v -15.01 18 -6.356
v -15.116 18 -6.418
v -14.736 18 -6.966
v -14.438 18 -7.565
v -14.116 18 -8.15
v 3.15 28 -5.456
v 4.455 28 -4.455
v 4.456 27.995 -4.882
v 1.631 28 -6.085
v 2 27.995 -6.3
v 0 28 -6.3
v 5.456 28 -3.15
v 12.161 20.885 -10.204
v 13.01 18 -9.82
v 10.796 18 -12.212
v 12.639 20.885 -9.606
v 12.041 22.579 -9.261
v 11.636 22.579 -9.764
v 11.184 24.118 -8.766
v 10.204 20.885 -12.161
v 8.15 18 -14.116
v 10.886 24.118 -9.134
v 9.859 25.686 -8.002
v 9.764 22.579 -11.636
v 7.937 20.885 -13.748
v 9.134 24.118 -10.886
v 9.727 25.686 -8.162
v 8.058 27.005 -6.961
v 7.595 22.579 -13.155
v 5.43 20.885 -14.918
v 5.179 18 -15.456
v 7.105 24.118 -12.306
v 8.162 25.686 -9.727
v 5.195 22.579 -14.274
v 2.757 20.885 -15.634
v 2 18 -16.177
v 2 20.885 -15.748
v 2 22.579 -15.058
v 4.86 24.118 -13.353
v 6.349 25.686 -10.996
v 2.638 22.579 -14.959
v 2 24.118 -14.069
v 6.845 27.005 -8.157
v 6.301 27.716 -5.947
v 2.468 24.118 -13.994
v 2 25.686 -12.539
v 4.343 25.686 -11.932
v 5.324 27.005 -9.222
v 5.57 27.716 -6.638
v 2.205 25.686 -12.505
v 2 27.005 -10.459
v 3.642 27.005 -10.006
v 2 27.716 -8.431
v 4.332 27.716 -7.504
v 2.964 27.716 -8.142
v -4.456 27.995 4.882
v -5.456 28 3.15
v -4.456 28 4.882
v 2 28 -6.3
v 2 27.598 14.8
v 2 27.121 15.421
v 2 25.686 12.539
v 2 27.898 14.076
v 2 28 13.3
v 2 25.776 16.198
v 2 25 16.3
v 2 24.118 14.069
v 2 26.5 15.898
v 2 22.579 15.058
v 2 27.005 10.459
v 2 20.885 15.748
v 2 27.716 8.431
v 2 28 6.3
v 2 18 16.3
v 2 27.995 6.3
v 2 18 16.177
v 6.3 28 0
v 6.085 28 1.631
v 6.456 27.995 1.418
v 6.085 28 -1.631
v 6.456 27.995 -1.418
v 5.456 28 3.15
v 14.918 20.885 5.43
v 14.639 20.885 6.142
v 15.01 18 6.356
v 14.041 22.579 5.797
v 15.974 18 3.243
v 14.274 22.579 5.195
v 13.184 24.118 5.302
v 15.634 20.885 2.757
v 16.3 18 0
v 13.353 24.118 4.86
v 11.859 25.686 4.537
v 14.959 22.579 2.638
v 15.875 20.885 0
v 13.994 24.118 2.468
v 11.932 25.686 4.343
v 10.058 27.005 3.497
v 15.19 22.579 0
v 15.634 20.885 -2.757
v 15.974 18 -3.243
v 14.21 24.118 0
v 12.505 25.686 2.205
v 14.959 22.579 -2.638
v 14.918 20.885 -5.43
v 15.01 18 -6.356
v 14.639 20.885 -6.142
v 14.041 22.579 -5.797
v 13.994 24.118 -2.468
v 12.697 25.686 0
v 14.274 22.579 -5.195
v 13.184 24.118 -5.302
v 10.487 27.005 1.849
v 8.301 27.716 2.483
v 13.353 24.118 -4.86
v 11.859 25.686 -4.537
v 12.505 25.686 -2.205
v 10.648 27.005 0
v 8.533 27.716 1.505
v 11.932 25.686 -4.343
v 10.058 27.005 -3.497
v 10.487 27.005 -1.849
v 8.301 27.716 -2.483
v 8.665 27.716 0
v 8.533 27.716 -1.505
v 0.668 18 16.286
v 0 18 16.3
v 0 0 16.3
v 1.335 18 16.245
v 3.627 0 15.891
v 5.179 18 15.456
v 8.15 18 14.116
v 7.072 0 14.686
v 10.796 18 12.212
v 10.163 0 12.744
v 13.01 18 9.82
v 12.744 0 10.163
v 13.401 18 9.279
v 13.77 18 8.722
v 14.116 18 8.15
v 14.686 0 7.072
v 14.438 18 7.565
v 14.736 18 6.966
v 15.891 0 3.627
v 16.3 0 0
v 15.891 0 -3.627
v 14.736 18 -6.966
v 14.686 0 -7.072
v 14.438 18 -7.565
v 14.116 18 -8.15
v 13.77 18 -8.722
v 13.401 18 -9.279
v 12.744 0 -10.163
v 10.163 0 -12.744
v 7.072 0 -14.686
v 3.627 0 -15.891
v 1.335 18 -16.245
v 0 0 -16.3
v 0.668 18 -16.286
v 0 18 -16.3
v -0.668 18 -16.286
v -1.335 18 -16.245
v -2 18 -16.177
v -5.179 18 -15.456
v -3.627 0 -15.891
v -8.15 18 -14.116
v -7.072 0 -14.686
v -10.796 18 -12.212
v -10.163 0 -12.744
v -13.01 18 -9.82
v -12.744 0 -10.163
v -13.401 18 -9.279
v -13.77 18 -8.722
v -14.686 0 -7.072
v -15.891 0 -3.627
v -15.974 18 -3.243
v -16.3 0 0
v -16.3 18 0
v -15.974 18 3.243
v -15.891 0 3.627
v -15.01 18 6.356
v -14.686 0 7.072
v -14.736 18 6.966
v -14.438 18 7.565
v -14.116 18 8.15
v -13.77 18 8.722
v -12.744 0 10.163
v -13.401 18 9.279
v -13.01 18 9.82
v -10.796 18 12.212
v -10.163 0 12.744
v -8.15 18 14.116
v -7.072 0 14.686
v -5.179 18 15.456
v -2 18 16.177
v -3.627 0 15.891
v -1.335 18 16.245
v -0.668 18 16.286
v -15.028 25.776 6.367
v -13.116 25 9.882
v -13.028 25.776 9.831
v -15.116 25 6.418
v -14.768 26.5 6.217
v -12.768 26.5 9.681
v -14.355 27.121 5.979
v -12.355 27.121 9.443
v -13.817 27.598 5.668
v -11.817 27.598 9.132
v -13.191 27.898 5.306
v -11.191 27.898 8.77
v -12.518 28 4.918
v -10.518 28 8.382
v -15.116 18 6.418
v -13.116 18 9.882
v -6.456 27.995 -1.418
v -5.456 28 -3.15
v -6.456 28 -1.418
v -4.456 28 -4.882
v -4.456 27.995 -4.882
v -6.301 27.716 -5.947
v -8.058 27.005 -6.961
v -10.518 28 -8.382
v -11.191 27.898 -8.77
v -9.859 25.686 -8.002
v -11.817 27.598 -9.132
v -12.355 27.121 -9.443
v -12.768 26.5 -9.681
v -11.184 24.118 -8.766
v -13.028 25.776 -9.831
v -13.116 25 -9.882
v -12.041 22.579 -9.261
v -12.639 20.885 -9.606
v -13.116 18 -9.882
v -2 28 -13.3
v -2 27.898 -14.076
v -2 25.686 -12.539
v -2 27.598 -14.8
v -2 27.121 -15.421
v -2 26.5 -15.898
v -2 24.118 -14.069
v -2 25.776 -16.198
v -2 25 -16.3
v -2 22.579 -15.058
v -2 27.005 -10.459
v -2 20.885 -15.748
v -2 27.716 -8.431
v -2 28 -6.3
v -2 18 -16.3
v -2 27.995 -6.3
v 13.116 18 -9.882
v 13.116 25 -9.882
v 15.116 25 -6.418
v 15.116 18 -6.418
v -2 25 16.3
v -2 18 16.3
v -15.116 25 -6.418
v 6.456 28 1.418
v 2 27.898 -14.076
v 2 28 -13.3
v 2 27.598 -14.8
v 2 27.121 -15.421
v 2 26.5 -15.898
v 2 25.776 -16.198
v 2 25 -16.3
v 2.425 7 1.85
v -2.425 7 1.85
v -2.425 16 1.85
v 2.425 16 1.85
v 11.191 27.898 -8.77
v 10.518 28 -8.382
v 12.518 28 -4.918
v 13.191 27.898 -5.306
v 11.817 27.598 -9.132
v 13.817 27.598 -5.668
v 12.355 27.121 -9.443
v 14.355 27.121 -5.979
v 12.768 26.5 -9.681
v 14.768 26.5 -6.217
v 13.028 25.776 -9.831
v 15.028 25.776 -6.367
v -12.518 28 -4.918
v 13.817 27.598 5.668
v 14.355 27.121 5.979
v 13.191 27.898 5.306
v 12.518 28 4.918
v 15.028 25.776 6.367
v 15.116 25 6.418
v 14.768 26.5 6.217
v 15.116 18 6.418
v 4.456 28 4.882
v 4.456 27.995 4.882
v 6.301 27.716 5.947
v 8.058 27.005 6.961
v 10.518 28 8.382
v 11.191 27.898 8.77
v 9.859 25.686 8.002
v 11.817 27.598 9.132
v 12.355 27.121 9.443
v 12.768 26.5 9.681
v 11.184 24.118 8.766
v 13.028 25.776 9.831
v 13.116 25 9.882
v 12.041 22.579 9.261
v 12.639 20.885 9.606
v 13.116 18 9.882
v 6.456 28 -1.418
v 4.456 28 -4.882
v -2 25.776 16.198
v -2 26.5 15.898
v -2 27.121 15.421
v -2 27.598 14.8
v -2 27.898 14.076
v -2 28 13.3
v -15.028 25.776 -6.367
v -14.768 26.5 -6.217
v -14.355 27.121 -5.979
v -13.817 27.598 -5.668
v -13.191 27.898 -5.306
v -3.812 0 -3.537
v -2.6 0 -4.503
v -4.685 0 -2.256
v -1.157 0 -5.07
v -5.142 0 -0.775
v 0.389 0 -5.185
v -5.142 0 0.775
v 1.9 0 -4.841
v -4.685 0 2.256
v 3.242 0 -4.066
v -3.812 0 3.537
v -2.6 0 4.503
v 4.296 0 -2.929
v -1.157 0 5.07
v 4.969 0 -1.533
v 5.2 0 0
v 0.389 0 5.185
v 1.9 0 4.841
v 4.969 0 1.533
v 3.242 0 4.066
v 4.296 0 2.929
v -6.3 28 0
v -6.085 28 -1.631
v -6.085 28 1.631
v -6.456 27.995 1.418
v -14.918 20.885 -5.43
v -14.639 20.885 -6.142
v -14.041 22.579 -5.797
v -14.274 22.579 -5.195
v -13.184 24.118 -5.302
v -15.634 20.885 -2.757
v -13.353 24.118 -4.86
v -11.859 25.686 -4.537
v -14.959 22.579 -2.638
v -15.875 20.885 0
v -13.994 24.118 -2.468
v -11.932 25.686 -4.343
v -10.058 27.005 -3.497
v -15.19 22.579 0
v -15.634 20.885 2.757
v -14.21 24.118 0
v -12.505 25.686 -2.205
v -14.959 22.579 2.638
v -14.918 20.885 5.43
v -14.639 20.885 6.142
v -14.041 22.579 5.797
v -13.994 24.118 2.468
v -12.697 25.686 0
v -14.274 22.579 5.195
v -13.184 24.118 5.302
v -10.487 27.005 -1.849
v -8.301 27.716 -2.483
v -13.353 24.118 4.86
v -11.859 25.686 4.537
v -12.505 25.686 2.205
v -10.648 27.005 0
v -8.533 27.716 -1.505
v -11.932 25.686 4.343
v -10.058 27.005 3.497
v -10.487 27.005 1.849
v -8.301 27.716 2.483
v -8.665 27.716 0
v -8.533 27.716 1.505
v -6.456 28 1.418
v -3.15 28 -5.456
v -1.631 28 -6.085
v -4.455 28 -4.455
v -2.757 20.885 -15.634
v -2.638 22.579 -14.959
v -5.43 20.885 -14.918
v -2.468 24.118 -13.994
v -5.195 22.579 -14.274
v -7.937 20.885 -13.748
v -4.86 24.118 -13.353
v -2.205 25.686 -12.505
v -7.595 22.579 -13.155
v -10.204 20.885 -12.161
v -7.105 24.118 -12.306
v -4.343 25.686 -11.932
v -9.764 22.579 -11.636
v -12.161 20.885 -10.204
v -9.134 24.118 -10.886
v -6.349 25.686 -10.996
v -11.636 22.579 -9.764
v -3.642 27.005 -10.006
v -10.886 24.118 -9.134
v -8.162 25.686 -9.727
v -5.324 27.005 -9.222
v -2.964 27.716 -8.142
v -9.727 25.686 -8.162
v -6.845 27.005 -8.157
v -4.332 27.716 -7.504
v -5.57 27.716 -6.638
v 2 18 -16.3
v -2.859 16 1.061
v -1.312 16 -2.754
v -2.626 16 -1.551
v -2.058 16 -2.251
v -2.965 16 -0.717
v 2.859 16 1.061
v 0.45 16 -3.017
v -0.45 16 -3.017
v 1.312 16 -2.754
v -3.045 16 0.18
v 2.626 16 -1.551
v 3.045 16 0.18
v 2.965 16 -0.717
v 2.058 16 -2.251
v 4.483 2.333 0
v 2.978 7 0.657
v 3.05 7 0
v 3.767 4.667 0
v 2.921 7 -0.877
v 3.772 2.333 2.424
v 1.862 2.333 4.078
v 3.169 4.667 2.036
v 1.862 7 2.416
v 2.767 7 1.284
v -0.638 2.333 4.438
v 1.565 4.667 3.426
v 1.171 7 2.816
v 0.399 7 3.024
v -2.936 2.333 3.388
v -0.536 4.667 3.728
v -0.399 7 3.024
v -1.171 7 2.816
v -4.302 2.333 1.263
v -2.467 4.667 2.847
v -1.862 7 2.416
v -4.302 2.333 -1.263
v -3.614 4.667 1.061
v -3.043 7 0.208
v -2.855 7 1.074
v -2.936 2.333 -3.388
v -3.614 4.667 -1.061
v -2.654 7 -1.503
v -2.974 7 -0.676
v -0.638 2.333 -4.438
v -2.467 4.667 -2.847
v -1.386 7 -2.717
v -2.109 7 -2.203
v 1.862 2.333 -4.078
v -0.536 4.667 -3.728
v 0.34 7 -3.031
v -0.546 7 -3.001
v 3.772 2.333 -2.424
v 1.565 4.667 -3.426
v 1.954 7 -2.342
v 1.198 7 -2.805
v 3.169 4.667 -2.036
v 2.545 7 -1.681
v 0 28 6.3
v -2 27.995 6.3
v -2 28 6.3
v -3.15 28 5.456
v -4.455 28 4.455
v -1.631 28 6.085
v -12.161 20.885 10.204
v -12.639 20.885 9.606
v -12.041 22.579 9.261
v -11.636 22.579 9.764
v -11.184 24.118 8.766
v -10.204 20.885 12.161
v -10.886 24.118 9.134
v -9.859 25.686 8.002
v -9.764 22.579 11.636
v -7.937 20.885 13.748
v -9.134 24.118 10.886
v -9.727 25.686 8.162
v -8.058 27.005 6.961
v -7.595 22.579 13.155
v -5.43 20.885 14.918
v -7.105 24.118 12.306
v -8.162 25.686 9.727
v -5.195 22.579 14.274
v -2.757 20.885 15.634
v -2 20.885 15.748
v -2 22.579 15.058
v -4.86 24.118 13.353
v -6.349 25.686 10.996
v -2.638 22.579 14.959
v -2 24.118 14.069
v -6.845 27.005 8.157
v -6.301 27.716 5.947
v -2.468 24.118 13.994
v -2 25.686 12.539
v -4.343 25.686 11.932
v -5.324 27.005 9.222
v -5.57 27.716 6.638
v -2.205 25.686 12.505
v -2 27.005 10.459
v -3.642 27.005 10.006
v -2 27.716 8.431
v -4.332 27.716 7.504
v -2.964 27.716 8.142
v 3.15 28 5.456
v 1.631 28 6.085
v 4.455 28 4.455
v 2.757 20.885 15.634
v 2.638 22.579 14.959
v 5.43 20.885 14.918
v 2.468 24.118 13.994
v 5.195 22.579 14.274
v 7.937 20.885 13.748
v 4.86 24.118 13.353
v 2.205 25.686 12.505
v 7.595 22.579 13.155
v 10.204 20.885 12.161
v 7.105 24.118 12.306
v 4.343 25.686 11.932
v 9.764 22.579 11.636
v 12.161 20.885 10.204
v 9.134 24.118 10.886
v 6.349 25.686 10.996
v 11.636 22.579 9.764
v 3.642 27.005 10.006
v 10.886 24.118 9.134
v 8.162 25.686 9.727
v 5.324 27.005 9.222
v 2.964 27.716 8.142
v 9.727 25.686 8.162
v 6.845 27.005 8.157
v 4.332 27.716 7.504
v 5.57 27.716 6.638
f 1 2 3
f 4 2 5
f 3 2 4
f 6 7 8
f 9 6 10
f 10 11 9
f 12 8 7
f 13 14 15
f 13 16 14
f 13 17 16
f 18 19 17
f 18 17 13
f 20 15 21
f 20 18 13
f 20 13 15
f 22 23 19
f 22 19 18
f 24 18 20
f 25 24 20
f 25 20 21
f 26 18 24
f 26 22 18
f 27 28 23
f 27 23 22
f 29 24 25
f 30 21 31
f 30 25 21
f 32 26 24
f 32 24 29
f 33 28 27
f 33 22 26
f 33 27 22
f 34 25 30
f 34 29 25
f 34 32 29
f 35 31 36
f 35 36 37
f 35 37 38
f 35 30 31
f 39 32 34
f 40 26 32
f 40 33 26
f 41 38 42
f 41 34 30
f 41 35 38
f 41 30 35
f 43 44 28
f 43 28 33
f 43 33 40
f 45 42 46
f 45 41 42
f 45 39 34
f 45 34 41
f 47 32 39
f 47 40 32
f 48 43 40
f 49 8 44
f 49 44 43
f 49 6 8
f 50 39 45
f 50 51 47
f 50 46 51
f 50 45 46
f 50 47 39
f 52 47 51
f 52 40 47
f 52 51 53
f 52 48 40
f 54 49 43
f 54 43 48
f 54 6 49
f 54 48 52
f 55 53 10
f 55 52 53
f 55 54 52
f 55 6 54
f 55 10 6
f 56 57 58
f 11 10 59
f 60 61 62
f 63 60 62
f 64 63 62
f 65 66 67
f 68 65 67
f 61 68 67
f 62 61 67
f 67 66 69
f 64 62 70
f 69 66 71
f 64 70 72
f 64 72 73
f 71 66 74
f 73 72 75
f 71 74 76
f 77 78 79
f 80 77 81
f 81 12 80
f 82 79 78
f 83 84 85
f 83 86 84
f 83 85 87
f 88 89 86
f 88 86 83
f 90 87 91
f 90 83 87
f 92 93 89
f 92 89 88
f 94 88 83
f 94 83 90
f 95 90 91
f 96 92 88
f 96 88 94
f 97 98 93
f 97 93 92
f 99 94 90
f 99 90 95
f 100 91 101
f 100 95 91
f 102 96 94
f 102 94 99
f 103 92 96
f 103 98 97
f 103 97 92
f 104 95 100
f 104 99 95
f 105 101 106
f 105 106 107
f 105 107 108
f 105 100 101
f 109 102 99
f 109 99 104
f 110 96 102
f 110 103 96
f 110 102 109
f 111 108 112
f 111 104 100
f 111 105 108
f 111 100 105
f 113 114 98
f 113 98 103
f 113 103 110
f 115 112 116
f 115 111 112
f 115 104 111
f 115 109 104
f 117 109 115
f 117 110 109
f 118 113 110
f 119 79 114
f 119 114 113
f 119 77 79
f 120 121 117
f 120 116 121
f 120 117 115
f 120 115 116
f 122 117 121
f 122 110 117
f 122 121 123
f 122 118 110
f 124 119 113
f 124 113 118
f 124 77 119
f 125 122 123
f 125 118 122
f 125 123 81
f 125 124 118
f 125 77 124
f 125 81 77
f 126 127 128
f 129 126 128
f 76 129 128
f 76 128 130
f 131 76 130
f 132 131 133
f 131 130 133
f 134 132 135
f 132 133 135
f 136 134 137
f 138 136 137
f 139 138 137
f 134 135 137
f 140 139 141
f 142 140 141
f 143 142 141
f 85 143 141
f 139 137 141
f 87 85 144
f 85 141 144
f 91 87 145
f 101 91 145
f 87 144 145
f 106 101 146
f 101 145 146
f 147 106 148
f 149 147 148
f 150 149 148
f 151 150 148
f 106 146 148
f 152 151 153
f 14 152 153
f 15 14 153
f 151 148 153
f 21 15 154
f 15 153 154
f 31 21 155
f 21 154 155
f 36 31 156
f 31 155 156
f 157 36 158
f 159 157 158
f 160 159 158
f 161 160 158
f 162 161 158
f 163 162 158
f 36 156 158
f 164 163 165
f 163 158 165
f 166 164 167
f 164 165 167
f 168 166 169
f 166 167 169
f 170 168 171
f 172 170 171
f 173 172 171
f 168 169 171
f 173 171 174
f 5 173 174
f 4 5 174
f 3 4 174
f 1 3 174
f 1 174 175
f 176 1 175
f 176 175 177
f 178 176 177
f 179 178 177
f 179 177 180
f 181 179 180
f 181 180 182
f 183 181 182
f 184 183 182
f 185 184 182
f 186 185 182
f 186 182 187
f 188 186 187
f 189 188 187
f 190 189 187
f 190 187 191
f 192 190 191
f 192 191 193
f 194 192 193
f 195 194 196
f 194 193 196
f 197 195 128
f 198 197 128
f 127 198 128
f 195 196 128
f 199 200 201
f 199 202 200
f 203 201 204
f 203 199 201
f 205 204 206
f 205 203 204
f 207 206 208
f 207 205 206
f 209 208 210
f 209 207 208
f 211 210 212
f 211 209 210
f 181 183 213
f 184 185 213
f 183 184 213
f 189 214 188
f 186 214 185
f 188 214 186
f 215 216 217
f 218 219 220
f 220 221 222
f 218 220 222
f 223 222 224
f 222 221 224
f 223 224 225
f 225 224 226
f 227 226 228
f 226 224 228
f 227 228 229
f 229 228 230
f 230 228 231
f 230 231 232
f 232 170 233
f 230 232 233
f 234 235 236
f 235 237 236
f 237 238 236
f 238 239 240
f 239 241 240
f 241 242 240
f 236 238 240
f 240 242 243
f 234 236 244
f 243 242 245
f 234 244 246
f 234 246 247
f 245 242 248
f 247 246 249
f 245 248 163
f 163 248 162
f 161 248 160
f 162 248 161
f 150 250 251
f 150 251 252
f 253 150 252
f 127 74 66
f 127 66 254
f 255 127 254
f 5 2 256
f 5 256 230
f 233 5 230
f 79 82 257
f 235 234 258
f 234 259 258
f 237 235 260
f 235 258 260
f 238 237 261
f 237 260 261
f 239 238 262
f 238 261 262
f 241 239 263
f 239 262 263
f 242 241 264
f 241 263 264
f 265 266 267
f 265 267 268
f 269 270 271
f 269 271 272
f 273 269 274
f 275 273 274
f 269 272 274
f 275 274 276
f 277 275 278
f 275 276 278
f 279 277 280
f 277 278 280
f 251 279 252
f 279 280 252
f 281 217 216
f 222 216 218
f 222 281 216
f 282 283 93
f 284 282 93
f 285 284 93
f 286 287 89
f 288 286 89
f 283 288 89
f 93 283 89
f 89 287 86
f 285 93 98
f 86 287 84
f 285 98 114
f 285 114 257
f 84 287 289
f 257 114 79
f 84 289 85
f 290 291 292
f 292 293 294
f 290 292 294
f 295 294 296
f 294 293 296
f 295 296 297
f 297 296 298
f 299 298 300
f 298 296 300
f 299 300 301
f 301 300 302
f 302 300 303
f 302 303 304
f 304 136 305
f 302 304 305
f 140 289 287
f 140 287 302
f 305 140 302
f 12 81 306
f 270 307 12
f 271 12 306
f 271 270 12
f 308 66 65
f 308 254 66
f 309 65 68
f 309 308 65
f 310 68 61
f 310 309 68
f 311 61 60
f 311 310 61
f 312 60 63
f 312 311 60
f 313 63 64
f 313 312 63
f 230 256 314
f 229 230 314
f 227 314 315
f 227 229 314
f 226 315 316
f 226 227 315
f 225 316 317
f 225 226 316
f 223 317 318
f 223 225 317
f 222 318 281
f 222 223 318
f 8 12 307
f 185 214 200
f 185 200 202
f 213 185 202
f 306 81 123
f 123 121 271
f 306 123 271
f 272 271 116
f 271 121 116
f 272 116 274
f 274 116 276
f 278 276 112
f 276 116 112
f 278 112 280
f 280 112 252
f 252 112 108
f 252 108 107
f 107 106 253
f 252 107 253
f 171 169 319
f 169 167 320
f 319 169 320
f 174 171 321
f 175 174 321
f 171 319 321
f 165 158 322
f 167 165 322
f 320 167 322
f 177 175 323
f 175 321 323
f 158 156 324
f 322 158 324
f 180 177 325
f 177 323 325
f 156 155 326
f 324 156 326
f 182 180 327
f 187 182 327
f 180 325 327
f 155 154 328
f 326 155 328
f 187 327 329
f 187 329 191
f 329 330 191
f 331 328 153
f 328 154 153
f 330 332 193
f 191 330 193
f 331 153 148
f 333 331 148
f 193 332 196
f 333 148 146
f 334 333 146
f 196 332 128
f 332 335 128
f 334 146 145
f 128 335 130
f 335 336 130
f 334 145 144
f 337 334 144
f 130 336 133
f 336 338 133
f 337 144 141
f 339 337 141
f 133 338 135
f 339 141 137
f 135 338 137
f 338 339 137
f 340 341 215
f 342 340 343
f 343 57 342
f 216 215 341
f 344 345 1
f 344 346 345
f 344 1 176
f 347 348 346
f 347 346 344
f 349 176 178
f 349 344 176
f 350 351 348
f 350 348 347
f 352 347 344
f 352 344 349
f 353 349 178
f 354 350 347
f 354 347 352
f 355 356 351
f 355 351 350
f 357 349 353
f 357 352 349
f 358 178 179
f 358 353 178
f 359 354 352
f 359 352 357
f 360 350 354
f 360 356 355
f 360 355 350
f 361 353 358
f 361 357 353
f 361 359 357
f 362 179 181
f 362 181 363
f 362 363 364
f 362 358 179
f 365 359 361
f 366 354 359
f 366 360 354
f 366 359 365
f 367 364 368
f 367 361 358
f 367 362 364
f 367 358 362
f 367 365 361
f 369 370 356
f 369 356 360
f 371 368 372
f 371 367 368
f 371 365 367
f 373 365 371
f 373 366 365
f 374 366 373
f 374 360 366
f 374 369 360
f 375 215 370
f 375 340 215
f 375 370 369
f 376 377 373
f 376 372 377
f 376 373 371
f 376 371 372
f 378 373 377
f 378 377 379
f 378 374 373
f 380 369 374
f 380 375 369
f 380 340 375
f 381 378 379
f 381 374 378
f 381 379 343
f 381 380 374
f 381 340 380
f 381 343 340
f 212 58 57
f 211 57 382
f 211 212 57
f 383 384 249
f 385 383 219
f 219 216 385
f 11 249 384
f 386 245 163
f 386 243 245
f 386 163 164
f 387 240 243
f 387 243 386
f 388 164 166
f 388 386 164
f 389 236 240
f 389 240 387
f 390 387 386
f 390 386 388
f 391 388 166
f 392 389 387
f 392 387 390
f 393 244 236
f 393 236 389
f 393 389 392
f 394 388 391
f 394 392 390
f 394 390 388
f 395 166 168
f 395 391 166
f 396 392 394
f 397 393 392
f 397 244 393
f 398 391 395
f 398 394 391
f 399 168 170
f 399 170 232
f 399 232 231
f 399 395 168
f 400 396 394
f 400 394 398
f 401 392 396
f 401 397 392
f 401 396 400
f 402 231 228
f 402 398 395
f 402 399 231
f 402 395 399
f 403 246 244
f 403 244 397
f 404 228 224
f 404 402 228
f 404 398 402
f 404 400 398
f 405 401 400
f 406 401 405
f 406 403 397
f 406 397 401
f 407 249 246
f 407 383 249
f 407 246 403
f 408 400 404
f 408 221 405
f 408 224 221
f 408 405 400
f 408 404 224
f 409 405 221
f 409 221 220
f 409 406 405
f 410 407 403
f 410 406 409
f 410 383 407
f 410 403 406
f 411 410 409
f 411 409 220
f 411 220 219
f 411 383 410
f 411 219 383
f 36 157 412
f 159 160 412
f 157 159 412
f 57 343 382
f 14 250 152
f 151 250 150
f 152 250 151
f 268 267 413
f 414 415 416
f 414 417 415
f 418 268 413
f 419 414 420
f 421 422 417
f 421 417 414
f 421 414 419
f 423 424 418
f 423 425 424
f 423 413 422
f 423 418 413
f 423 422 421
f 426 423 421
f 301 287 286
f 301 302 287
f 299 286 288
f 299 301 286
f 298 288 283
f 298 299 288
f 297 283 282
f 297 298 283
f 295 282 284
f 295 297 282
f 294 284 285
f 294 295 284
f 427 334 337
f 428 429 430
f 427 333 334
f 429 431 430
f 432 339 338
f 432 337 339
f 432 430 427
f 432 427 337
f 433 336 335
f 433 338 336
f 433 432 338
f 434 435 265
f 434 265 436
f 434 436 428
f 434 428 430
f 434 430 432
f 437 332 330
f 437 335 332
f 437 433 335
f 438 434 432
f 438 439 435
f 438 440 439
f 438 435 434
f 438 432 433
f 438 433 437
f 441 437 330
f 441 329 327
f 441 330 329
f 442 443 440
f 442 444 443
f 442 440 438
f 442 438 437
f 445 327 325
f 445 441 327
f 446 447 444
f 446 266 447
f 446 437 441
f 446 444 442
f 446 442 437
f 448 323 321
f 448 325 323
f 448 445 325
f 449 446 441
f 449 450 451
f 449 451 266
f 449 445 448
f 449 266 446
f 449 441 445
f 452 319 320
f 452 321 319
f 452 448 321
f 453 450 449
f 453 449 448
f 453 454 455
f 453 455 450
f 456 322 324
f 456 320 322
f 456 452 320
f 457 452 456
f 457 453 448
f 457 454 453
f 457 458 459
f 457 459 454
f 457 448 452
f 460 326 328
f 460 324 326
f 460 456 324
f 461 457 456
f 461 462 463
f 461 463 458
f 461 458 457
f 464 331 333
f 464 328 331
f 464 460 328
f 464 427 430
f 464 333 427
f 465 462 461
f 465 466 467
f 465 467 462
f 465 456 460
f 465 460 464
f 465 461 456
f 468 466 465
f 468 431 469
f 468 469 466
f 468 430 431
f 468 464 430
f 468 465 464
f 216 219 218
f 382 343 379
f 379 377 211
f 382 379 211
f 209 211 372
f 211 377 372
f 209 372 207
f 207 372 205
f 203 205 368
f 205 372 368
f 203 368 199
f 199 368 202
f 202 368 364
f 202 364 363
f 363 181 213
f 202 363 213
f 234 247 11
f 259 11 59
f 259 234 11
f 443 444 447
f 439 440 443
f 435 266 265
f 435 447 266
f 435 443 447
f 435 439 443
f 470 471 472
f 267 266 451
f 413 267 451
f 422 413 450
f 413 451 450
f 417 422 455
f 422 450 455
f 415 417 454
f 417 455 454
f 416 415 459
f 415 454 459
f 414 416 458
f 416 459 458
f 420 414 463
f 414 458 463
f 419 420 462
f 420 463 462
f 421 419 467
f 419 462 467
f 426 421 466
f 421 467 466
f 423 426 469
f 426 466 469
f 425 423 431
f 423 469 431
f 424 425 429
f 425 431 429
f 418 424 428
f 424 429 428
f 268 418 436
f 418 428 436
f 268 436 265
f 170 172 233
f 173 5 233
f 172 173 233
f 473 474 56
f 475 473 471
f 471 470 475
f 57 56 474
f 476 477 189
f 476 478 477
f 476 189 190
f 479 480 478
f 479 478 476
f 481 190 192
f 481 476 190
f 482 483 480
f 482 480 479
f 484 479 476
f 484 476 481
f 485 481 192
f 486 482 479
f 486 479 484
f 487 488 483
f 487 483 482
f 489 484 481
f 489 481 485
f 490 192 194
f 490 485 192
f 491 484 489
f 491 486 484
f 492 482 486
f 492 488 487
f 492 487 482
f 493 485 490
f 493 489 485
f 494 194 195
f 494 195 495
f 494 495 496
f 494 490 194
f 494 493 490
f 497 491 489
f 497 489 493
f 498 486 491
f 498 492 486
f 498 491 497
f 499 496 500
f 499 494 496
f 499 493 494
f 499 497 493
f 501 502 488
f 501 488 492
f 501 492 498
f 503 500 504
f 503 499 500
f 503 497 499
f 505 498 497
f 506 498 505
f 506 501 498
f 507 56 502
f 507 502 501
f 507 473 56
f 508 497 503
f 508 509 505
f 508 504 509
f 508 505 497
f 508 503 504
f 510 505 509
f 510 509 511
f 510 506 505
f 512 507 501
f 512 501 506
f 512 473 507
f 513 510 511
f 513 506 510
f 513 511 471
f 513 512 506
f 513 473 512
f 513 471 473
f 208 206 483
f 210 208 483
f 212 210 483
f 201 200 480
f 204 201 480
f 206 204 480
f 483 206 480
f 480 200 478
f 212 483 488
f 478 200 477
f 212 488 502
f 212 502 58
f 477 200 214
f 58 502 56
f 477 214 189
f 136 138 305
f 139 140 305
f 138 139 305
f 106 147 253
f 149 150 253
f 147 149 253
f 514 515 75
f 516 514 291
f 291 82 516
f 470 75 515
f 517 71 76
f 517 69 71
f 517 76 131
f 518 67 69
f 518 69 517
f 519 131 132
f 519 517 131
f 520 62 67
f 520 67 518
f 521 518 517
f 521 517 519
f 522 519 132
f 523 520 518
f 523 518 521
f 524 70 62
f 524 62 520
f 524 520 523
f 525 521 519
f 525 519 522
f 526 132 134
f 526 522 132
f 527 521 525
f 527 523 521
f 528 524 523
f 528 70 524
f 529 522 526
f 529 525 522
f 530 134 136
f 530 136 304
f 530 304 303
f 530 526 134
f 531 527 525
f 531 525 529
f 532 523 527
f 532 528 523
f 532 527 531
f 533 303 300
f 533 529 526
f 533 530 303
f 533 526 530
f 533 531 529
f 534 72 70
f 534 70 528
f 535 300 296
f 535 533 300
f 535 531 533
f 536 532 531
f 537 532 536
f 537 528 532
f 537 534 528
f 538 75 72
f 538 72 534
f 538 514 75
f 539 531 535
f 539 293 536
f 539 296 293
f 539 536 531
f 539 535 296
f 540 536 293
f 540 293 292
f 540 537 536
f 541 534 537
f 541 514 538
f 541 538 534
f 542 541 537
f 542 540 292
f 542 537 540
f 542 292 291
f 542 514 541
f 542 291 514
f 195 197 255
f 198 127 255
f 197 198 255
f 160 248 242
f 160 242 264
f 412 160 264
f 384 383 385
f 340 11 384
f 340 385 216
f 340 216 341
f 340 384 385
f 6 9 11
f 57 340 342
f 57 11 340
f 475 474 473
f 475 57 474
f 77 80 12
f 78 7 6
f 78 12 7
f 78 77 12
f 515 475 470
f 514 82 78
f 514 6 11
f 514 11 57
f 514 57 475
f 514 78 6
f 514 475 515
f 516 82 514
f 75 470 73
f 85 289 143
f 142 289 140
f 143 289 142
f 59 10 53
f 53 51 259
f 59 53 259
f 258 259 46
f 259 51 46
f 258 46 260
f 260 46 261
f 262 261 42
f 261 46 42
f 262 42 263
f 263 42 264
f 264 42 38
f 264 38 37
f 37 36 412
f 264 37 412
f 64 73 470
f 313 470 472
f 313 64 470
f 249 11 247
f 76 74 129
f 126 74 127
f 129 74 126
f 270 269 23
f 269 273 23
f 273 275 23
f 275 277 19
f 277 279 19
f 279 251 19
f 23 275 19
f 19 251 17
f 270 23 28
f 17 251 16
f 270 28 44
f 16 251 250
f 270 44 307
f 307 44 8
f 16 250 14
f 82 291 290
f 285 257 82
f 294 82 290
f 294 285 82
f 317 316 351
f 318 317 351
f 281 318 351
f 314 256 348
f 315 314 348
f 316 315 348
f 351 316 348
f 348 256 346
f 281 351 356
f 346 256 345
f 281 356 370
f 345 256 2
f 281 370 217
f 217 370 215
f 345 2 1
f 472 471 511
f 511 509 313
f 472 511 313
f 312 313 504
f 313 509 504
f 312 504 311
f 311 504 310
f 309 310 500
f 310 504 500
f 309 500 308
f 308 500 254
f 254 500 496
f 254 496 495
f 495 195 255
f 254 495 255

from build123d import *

# Parameters (mm, degrees)
SKETCH1_R           = 16.3
BOSS_EXTRUDE1_DEPTH = 28
FILLET1_R           = 10
SKETCH4_R           = 5.2
SKETCH5_R           = 3.05
SKETCH6_R           = 3.05
CUT_EXTRUDE1_DEPTH  = 9
BOSS_EXTRUDE3_START = 9
BOSS_EXTRUDE3_DEPTH = 9
BOSS_EXTRUDE4_DEPTH = 10
CIRPATTERN1_COUNT   = 6
FILLET2_R           = 3


with BuildPart() as part:
    # Sketch1 → Boss-Extrude1 (new body)
    with BuildSketch(Plane(origin=(0, 0, 0), x_dir=(1, 0, 0), z_dir=(0, 1, 0))):
        with Locations(Location((0, 0, 0), (0, 0, 270))):
            Circle(SKETCH1_R)
    extrude(amount=BOSS_EXTRUDE1_DEPTH)

    # Fillet1
    fillet1_edges = [part.edges().sort_by_distance(p)[0] for p in [
        (0, 28, -16.3),
    ]]
    fillet(fillet1_edges, radius=FILLET1_R)

    # Sketch4 → Cut-Loft1 section 0
    with BuildSketch(Plane.XZ):
        Circle(SKETCH4_R)
    # Sketch5 → Cut-Loft1 section 1
    with BuildSketch(Plane(origin=(0, 7, 0), x_dir=(-1, 0, 0), z_dir=(0, -1, 0))):
        Circle(SKETCH5_R)
    loft(mode=Mode.SUBTRACT)

    # Sketch6 → Cut-Extrude1 (cut)
    with BuildSketch(Plane.XZ.offset(-7)):
        with Locations(Location((0, 0, 0), (0, 0, 270))):
            Circle(SKETCH6_R)
    extrude(amount=-CUT_EXTRUDE1_DEPTH, mode=Mode.SUBTRACT)

    # Sketch7 → Boss-Extrude3 (add)
    with BuildSketch(Plane.XZ.offset(-16).offset(BOSS_EXTRUDE3_START)):
        with BuildLine():
            Line((-2.424871131, 1.85), (2.424871131, 1.85))
            ThreePointArc((2.424871131, 1.85), (0, 3.05), (-2.424871131, 1.85))
        make_face()
    extrude(amount=-BOSS_EXTRUDE3_DEPTH)

    # Sketch8 → Boss-Extrude4 (add)
    with BuildSketch(Plane(origin=(0, 18, 0), x_dir=(-1, 0, 0), z_dir=(0, -1, 0))):
        Polygon((0, 6.3), (-2, 6.3), (-2, 16.3), (0, 16.3), (2, 16.3), (2, 6.3), align=None)
    boss_extrude4 = extrude(amount=-BOSS_EXTRUDE4_DEPTH)

    # CirPattern1: Boss-Extrude4 ×6 about axis
    cirpattern1_axis = Axis((0, 0, 0), (0, 1, 0))
    for i in range(1, CIRPATTERN1_COUNT):
        add(boss_extrude4.rotate(cirpattern1_axis, i * 360 / CIRPATTERN1_COUNT))

    # Fillet2
    fillet2_edges = [part.edges().sort_by_distance(p)[0] for p in [
        (14.116214082, 28, 8.15),
        (14.116214082, 28, -8.15),
        (0, 28, -16.3),
        (-14.116214082, 28, -8.15),
        (-14.116214082, 28, 8.15),
        (0, 28, 16.3),
    ]]
    fillet(fillet2_edges, radius=FILLET2_R)


solid = part.part
